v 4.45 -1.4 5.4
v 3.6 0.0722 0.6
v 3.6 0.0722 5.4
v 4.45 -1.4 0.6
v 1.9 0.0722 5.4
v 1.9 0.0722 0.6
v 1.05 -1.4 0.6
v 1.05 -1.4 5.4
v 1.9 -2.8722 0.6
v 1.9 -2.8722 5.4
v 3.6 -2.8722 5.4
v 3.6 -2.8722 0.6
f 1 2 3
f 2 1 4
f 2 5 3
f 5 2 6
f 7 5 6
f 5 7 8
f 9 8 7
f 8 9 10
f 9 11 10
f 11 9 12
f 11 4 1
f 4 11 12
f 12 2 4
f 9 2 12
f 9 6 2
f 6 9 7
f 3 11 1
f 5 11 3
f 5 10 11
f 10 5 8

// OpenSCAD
union() {
  translate([2.75, -1.4, 0.6]) cylinder(h=4.8, r=1.7, center=false);
}
